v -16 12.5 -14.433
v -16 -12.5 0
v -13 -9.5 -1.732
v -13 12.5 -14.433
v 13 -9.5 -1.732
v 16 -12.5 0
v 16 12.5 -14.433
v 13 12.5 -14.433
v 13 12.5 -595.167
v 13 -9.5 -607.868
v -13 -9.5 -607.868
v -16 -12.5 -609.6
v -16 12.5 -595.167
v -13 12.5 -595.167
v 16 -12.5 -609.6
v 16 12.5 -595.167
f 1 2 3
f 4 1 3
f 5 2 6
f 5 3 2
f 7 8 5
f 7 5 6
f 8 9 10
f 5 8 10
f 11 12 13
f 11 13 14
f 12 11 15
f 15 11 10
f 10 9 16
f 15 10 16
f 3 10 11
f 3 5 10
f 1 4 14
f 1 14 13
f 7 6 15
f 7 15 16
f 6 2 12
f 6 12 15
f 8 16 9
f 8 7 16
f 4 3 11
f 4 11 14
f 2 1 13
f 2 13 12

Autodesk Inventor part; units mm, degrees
ref_plane "YZ Plane" through (0, 0, 0) normal (1, 0, 0) x (0, 1, 0)
ref_plane "XZ Plane" through (0, 0, 0) normal (0, 1, 0) x (-1, 0, 0)
ref_plane "XY Plane" through (0, 0, 0) normal (0, 0, 1) x (1, 0, 0)
sketch "Sketch1" plane through (0, 0, 0) normal (0, 0, 1) x (1, 0, 0)
  line L0 (-16, -12.5) -> (16, -12.5)
  line L1 (16, -12.5) -> (16, 12.5)
  line L2 (16, 12.5) -> (13, 12.5)
  line L3 (13, 12.5) -> (13, -9.5)
  line L4 (13, -9.5) -> (-13, -9.5)
  line L5 (-13, -9.5) -> (-13, 12.5)
  line L6 (-13, 12.5) -> (-16, 12.5)
  line L7 (-16, 12.5) -> (-16, -12.5)
  point P0 (0, 0)
  dimension "d0" = 32
  dimension "d1" = 25
  dimension "d2" = 3
  dimension "d3" = 90
  dimension "d4" = 22
  dimension "d5" = 26
  dimension "d6" = 22
  dimension "d7" = 3
  dimension "d8" = 25
  dimension "d10" = 12.5
  dimension "d11" = 16
extrude "Extrusion1" add sketch "Sketch1" against normal blind 609.6
chamfer "Chamfer1" distance 25 angle 30 1 edges at (14.5, 12.5, 0) measured on face at (4.3333, -11.5, 0)
chamfer "Chamfer2" distance 25 angle 30 1 edges at (14.5, 12.5, -609.6) measured on face at (4.3333, -11.5, -609.6)
equation "\"d5\" = d0 - 2 * d2"
equation "\"d10\" = 0.5 * d1"
equation "\"d11\" = 0.5 * d0"
properties part number "Chassis Edge"
